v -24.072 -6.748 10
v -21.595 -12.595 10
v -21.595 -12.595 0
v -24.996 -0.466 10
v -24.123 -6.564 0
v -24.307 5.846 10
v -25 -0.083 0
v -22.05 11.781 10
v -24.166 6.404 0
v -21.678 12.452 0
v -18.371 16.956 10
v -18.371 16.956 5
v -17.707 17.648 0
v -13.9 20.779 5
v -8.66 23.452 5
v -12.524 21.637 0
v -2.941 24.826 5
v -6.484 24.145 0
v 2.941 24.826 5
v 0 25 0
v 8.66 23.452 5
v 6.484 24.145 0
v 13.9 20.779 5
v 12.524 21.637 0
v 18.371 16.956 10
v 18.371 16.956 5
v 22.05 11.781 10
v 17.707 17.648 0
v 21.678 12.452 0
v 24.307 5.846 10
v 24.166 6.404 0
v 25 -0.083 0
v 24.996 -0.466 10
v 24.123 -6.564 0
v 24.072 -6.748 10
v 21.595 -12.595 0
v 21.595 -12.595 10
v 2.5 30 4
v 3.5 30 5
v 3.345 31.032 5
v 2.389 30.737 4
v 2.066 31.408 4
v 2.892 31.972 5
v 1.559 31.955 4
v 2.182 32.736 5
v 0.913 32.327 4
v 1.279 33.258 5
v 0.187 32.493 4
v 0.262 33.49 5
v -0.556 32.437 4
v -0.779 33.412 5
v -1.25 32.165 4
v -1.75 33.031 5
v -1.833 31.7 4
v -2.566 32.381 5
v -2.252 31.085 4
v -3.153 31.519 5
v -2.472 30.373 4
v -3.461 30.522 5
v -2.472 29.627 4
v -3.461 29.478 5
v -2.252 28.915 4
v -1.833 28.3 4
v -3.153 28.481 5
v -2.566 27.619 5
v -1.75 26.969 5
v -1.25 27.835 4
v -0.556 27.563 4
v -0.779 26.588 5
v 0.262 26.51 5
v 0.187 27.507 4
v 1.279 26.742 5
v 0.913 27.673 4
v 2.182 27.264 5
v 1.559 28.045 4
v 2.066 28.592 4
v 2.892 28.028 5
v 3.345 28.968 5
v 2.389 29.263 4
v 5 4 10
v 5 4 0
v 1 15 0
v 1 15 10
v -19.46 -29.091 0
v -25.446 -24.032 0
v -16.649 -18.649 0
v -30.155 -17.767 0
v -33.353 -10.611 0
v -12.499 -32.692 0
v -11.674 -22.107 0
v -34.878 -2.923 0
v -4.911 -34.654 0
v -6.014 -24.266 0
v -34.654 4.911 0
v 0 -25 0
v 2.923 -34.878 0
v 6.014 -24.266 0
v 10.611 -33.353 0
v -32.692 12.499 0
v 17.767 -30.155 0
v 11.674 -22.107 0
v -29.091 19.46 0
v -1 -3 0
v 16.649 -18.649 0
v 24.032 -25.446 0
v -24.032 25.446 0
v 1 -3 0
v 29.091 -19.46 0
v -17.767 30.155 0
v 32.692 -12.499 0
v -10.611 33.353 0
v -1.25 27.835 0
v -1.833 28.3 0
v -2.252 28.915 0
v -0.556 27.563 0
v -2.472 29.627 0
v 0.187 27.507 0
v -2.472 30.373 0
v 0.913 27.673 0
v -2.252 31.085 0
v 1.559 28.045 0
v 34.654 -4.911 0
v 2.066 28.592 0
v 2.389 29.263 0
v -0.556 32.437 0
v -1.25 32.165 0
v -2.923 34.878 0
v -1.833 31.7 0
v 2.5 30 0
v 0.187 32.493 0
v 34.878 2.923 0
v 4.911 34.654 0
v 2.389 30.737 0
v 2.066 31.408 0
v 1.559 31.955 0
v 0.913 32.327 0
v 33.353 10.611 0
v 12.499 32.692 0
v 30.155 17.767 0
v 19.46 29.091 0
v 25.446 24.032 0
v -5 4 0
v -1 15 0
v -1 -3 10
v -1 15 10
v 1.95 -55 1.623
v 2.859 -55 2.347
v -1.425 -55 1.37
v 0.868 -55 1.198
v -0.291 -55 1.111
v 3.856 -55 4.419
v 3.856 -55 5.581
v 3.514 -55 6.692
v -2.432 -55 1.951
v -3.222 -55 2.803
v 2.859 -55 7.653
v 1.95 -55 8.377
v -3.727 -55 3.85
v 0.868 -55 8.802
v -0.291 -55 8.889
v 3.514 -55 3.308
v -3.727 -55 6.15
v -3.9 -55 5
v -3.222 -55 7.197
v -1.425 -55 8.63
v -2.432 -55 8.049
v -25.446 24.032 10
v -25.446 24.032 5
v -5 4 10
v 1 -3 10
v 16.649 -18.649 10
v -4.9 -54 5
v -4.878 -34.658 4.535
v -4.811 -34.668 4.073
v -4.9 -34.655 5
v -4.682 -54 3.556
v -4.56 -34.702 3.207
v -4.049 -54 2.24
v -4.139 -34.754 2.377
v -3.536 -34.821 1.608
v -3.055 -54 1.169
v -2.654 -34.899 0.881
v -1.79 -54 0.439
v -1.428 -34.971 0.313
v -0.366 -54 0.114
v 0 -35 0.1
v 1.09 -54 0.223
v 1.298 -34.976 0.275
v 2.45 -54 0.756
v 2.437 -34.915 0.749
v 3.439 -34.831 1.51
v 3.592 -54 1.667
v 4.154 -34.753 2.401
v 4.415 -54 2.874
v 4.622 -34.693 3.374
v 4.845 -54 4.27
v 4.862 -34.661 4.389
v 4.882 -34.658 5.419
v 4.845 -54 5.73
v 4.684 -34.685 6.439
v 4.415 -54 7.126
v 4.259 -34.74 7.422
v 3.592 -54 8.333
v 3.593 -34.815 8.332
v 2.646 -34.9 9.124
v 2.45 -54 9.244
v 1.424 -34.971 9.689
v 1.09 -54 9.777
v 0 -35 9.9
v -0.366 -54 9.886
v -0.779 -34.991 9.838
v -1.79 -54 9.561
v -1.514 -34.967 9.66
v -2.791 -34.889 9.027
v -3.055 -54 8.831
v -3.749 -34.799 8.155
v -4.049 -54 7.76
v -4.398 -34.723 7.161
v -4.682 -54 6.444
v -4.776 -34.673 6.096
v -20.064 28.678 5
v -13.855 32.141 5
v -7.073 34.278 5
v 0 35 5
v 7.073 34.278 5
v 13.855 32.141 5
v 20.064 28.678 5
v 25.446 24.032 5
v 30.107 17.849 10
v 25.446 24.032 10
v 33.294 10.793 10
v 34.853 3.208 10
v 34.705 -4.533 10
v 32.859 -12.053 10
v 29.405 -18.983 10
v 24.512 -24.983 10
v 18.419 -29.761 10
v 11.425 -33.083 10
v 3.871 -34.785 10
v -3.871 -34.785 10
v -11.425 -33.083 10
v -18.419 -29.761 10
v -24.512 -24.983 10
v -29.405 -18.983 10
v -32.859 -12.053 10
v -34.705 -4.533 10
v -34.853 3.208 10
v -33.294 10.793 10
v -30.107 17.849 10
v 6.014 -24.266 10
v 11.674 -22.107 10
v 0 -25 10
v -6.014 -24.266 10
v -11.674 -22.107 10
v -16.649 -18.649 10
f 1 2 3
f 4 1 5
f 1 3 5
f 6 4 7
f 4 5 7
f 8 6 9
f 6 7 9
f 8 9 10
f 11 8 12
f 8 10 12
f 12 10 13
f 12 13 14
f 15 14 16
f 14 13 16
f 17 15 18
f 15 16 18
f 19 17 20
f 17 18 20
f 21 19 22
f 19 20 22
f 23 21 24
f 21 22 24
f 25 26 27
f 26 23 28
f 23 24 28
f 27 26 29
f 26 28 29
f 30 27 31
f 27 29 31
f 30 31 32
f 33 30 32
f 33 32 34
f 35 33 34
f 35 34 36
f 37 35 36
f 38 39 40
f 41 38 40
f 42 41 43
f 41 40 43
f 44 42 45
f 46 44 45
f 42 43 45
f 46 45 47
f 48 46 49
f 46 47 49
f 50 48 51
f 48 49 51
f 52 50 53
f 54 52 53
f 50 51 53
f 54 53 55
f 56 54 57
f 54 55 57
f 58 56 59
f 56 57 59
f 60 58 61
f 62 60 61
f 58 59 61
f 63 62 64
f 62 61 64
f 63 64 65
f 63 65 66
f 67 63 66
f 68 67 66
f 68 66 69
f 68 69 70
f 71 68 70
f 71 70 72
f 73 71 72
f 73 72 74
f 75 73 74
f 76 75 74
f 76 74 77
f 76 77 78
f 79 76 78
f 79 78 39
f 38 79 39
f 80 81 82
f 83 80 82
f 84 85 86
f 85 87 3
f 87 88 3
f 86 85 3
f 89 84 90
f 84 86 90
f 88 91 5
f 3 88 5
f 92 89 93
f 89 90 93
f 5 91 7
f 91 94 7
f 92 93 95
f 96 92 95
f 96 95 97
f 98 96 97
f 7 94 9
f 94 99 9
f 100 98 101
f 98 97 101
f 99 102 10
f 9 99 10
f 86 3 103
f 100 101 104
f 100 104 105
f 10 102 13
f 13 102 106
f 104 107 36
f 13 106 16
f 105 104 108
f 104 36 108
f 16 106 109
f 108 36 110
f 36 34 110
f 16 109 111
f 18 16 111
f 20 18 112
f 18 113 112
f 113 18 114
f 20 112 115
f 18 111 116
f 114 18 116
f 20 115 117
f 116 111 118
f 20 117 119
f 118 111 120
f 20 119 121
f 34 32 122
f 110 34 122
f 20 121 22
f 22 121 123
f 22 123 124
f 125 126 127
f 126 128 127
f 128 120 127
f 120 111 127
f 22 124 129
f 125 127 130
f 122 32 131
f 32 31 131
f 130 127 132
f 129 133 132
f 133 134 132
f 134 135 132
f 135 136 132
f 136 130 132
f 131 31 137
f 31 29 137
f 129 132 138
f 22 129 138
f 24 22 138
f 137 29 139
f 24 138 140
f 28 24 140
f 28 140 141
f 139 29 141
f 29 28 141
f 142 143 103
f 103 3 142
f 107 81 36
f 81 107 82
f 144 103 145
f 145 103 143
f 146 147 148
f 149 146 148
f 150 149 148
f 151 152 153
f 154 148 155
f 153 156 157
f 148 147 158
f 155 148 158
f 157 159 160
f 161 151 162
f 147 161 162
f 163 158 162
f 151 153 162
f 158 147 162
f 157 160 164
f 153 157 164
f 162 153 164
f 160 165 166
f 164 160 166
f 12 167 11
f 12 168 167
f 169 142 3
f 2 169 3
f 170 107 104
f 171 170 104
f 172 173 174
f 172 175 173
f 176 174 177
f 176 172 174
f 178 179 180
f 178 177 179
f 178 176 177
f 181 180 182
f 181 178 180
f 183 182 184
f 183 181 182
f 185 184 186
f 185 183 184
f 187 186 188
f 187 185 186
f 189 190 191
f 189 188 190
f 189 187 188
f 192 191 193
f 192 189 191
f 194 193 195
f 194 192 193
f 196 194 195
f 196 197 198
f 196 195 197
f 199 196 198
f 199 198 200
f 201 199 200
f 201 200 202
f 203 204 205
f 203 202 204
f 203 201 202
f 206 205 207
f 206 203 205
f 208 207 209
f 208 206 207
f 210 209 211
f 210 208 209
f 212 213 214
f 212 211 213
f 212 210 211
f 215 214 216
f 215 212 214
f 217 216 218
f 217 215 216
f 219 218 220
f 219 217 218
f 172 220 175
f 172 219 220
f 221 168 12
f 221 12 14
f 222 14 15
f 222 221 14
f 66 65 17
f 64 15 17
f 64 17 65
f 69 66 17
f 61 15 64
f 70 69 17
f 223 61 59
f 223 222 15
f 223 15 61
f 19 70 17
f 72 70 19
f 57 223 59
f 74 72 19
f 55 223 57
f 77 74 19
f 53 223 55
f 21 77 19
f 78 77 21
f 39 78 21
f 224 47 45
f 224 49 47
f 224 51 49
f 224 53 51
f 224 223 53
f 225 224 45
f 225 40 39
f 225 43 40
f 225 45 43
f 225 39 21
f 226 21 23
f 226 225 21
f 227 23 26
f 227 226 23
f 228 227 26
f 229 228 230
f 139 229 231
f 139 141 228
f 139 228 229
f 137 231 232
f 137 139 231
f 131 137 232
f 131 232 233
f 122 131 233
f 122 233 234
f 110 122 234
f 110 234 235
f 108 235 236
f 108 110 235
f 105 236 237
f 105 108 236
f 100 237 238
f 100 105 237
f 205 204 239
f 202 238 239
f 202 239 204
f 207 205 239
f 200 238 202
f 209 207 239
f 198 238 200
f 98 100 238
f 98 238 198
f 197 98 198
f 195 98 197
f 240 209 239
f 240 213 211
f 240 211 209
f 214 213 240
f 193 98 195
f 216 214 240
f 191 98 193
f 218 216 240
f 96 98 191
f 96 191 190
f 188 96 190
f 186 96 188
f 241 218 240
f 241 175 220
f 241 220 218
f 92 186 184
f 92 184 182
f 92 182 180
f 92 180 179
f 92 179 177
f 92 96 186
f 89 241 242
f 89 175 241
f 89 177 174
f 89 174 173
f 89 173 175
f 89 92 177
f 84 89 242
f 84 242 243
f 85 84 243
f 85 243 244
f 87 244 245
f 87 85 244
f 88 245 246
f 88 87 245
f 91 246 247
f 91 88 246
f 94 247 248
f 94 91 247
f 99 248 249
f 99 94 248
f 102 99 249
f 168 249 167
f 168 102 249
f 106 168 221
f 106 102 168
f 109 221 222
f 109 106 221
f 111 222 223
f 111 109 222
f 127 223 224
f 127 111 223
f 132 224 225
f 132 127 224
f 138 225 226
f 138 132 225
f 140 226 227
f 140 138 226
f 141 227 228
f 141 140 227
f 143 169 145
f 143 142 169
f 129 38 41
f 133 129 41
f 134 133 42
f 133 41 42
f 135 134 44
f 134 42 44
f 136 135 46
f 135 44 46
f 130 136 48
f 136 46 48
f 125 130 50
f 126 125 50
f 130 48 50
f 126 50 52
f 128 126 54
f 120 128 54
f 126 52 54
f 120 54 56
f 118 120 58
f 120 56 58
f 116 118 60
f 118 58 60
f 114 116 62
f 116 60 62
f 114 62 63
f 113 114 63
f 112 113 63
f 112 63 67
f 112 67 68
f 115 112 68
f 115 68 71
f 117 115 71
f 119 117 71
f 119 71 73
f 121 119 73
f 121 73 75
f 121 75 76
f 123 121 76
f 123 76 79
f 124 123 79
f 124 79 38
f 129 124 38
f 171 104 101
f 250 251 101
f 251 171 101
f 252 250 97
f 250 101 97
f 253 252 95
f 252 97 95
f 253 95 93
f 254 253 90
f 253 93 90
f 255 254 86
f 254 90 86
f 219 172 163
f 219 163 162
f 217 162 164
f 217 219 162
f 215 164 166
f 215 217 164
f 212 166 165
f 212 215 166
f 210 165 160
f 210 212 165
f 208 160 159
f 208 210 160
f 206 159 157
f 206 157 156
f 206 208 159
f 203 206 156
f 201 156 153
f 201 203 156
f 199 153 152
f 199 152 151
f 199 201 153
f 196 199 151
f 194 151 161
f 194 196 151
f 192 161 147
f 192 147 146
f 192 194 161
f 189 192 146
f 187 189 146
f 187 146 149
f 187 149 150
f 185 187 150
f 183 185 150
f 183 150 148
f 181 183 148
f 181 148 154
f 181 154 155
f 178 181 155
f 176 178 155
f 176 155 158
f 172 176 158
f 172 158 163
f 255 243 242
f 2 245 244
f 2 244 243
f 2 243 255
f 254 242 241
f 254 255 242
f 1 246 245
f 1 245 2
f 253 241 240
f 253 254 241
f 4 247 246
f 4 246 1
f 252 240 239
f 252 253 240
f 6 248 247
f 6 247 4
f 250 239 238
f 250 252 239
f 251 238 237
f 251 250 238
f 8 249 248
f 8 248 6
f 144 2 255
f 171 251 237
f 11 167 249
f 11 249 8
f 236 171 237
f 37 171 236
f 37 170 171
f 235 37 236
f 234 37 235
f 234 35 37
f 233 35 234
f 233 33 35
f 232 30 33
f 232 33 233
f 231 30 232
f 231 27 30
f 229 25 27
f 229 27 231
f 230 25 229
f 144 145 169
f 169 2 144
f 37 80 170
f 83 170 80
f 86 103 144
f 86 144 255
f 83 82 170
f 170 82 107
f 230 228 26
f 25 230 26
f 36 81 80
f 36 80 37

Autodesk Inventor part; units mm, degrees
ref_plane "YZ Plane" through (0, 0, 0) normal (1, 0, 0) x (0, 1, 0)
ref_plane "XY Plane" through (0, 0, 0) normal (0, 0, 1) x (1, 0, 0)
sketch "Sketch1" plane through (0, 0, 0) normal (0, 0, 1) x (1, 0, 0)
  circle A0 centre (0, 0) radius 25
  circle A1 centre (0, 0) radius 35
  line L0 (-17.6777, 17.6777) -> (-24.7487, 24.7487)
  line L1 (0, 35) -> (0, 0) construction
  line L2 (-24.0315, 25.4457) -> (-16.9564, 18.3706)
  line L3 (-1.1667, 34.9806) -> (-1.1667, 34.9972)
  line L4 (1.1667, 34.9806) -> (1.1667, 34.9972)
  line L5 (17.6777, 17.6777) -> (24.7487, 24.7487)
  line L6 (24.0315, 25.4457) -> (16.9564, 18.3706)
  line L7 (-25.4457, 24.0315) -> (-18.3706, 16.9564)
  line L8 (25.4457, 24.0315) -> (18.3706, 16.9564)
  line L9 (-1, 15) -> (1, 15)
  line L10 (1, 15) -> (1, 0)
  line L11 (1, 0) -> (-1, 0)
  line L12 (-1, 0) -> (-1, 15)
  line L13 (-1, 0) -> (1, 0)
  line L14 (1, 0) -> (1, -7)
  line L15 (1, -7) -> (-1, -7)
  line L16 (-1, -7) -> (-1, 0)
  line L17 (-1, -7) -> (-5, -7)
  line L18 (-5, -7) -> (-5, 4)
  line L19 (-5, 4) -> (-1, 4)
  line L20 (-1, 4) -> (-1, -7)
  line L21 (-5, 4) -> (-21.5953, -12.5953)
  line L22 (-5, -7) -> (-16.6494, -18.6494)
  line L23 (-5, 4) -> (-1, 15)
  line L24 (-5, -7) -> (-1, -3)
  line L25 (1, 0) -> (1, 15)
  line L26 (1, -7) -> (1, 0)
  line L27 (5, 4) -> (21.5953, -12.5953)
  line L28 (5, -7) -> (16.6494, -18.6494)
  line L29 (5, 4) -> (1, 15)
  line L30 (5, -7) -> (1, -3)
  point P0 (-20.5061, 21.9203)
  point P1 (-21.9203, 20.5061)
  point P2 (20.5061, 21.9203)
  point P3 (21.9203, 20.5061)
  point P4 (-1, -3)
  point P5 (1, 0)
  point P6 (1, -3)
  point P7 (21.5953, -12.5953)
  dimension "d0" = 50
  dimension "d1" = 10
  dimension "d2" = 45
  dimension "d3" = 1
  dimension "d5" = 2
  dimension "d6" = 15
  dimension "d7" = 7
  dimension "d8" = 2
  dimension "d9" = 4
  dimension "d11" = 45
  dimension "d12" = 45
  dimension "d13" = 4
  dimension "d14" = 45
extrude "Extrusion1" add sketch "Sketch1" along normal blind 10 contours A0 L8 A1 L7 | A0 L28 L30 L14 L10 L29 L27 | A0 L21 L18 L22 | L18 L19 L12 L16 L24 | L12 L19 L23
sketch "Sketch2" plane through (0, 0, 0) normal (0, 0, 1) x (1, 0, 0)
  point P0 (0, 0)
extrude "Extrusion2" add sketch "Sketch1" along normal blind 5 contours A0 L5 A1 L8 | A0 L6 A1 L5 | A0 L2 A1 L6 | A0 L0 A1 L2 | A1 L0 A0 L7
sketch "Sketch4" plane through (0, 0, 5) normal (0, 0, 1) x (1, 0, 0)
  arc A0 (18.3706, 16.9564) -> (-18.3706, 16.9564) centre (0, 0) ccw construction
  circle A1 centre (0, 30) radius 2.5
  point P0 (0, 25)
  dimension "d19" = 5
  dimension "d20" = 5
extrude "Extrusion3" cut sketch "Sketch4" against normal through all
chamfer "Chamfer1" distance 1 angle 45 1 edges at (-2.5, 30, 5)
ref_plane "Work Plane1" through (0, -35, 0) normal (0, 1, 0) x (-1, 0, 0)
sketch "Sketch6" plane through (0, -35, 0) normal (0, 1, 0) x (-1, 0, 0)
  line L0 (3.5, 5) -> (-3.5, 5) construction
  circle A0 centre (0, 5) radius 4.9
  point P0 (0, 0)
  dimension "d27" = 9.8
extrude "Extrusion4" add sketch "Sketch6" along normal blind 5 and the other way blind 20
chamfer "Chamfer2" distance 1 angle 45 1 edges at (4.9, -55, 5)
properties part number "Black_Part1"
